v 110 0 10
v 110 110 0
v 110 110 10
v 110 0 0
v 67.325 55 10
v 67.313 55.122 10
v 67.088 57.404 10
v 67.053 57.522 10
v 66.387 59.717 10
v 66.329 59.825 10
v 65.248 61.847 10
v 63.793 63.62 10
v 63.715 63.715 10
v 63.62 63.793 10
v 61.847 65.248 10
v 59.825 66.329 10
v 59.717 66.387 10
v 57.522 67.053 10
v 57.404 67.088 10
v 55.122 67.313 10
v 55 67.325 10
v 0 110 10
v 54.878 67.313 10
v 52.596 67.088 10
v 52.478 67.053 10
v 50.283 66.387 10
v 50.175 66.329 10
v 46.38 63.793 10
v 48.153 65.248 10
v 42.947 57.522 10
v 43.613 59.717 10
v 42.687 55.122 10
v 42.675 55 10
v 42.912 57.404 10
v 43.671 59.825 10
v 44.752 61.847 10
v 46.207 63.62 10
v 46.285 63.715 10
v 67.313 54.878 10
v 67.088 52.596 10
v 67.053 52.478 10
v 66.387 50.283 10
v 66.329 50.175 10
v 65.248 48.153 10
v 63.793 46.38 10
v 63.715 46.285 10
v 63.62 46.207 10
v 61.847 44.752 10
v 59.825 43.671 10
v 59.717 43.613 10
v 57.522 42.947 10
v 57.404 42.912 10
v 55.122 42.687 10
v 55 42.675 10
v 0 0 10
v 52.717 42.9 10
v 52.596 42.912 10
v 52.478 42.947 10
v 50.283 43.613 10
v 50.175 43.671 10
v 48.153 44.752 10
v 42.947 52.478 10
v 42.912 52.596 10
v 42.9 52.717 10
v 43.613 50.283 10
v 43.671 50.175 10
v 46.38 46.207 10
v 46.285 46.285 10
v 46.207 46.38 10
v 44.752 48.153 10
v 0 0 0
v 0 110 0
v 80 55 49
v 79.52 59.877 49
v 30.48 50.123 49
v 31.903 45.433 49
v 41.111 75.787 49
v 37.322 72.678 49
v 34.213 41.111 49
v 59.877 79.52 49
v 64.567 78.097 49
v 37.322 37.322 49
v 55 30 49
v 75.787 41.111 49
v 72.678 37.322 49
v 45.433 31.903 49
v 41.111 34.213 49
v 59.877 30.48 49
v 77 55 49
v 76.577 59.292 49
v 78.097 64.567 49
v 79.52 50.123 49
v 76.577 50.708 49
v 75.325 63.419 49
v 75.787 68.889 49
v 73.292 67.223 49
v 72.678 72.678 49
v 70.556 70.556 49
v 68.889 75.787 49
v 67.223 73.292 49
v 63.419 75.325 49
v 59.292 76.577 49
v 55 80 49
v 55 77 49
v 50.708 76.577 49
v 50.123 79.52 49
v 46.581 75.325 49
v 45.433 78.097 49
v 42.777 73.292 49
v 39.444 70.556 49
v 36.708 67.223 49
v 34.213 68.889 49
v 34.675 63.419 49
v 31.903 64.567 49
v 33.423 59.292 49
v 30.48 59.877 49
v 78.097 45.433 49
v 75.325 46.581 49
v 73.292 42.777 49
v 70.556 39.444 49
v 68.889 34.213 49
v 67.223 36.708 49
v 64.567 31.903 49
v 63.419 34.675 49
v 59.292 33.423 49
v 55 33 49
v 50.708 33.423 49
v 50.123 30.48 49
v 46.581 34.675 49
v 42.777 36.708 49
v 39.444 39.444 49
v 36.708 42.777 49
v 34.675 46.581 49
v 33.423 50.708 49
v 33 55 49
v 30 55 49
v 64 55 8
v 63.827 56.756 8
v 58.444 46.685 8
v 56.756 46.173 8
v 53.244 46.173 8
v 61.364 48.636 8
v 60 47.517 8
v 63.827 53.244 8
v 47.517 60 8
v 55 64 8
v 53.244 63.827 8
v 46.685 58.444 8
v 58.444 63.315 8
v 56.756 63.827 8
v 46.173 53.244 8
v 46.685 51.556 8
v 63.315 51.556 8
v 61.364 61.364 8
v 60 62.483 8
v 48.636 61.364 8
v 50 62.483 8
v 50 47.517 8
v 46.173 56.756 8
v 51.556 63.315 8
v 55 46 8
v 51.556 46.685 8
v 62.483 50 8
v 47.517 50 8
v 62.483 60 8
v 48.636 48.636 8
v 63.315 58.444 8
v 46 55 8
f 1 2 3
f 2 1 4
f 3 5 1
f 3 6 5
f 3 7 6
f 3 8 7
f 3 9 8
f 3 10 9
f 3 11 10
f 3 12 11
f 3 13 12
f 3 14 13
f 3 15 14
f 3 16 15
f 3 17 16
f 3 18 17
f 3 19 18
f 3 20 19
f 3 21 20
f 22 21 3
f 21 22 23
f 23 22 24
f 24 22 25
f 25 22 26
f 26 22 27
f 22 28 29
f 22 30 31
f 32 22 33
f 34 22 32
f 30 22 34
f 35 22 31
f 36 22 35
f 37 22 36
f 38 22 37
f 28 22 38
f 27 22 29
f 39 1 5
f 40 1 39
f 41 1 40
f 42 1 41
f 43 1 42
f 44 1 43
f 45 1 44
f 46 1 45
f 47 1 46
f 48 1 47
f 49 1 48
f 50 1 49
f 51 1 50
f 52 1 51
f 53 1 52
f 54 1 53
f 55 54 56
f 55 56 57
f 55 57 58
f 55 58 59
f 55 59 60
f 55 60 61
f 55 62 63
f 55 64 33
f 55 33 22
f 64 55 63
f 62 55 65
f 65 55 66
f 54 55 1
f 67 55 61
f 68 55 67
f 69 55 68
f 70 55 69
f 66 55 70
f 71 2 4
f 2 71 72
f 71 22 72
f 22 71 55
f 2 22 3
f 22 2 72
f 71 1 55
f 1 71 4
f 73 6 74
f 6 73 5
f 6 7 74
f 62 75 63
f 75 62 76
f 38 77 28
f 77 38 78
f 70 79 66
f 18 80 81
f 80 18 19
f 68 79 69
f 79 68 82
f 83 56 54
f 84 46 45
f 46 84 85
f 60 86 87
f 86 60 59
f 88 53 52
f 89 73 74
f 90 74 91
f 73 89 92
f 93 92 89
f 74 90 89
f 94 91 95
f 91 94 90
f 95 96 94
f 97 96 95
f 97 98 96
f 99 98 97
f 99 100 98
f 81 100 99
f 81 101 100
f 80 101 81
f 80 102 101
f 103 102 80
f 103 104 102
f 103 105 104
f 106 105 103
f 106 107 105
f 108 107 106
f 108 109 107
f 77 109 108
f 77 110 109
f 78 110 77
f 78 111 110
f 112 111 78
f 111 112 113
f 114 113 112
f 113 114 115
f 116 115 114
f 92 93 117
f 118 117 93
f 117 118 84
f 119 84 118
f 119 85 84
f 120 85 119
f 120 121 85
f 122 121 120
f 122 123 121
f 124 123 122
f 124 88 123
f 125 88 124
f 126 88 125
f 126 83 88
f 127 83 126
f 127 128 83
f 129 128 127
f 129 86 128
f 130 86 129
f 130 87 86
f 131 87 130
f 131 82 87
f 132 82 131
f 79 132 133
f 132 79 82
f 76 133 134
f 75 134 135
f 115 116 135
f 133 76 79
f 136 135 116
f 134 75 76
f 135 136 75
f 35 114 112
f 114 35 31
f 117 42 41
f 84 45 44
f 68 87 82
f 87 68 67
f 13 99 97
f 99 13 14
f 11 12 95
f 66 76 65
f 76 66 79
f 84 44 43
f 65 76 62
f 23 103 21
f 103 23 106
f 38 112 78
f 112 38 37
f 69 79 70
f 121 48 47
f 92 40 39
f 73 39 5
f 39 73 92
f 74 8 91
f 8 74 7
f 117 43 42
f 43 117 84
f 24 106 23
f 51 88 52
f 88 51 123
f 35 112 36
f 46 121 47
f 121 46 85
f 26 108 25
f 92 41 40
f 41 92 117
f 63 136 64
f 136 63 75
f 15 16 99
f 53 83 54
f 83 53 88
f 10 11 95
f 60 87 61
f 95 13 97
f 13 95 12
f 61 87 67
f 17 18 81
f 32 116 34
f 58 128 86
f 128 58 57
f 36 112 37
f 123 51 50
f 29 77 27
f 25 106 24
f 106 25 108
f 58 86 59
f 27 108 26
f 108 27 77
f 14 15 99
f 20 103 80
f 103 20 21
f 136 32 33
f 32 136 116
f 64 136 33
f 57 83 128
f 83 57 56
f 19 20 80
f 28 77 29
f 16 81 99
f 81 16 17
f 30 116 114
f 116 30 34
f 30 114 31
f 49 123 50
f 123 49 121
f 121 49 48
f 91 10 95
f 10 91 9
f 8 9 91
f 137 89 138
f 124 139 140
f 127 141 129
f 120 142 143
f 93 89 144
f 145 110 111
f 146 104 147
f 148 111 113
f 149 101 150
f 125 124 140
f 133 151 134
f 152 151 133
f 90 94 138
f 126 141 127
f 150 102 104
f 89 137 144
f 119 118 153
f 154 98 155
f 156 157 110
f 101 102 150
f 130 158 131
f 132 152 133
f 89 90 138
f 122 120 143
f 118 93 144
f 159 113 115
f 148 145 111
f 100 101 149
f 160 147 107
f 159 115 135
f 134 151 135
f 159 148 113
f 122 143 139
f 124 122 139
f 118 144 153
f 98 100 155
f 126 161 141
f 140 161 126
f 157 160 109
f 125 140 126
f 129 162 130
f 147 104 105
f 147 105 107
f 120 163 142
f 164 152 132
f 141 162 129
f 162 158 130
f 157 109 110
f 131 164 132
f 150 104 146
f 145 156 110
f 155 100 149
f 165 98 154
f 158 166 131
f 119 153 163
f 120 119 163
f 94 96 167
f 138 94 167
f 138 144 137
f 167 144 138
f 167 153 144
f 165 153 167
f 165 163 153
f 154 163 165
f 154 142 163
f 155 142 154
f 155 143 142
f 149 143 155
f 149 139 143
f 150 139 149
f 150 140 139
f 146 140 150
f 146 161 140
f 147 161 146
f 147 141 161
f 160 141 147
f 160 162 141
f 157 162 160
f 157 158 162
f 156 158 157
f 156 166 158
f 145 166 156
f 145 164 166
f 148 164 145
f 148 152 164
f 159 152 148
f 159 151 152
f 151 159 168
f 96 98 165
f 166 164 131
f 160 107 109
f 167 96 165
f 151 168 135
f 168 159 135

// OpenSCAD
$fn = 32;

// ----------------------------------------------------------------------
// Hopper: funnel with square flange
// ----------------------------------------------------------------------

// --- parameters (mm) ---
fl = 110;                 // flange side, X and Y
fl_t = 10;                // flange thickness
cone_h = 40;              // cone height above the flange
top_d = 50;               // cone mouth diameter
bot_d = 24;               // cone spout diameter
wall = 3;                 // cone wall thickness
fit_tol = 0.02;           // tolerance for press fits, mm
free_tol = 0.2;           // tolerance for clearance fits, mm

bore_d = bot_d - 2 * wall;  // spout bore diameter
total_h = fl_t + cone_h - 1;  // overall height

difference() {
  union() {
    cube([fl, fl, fl_t]);
    translate([fl / 2, fl / 2, fl_t - 1])
      cylinder(h = cone_h, d1 = bot_d, d2 = top_d);
  }
  translate([fl / 2, fl / 2, fl_t - 2])
    cylinder(h = cone_h + 1, d1 = bore_d, d2 = top_d - 2 * wall);
}
